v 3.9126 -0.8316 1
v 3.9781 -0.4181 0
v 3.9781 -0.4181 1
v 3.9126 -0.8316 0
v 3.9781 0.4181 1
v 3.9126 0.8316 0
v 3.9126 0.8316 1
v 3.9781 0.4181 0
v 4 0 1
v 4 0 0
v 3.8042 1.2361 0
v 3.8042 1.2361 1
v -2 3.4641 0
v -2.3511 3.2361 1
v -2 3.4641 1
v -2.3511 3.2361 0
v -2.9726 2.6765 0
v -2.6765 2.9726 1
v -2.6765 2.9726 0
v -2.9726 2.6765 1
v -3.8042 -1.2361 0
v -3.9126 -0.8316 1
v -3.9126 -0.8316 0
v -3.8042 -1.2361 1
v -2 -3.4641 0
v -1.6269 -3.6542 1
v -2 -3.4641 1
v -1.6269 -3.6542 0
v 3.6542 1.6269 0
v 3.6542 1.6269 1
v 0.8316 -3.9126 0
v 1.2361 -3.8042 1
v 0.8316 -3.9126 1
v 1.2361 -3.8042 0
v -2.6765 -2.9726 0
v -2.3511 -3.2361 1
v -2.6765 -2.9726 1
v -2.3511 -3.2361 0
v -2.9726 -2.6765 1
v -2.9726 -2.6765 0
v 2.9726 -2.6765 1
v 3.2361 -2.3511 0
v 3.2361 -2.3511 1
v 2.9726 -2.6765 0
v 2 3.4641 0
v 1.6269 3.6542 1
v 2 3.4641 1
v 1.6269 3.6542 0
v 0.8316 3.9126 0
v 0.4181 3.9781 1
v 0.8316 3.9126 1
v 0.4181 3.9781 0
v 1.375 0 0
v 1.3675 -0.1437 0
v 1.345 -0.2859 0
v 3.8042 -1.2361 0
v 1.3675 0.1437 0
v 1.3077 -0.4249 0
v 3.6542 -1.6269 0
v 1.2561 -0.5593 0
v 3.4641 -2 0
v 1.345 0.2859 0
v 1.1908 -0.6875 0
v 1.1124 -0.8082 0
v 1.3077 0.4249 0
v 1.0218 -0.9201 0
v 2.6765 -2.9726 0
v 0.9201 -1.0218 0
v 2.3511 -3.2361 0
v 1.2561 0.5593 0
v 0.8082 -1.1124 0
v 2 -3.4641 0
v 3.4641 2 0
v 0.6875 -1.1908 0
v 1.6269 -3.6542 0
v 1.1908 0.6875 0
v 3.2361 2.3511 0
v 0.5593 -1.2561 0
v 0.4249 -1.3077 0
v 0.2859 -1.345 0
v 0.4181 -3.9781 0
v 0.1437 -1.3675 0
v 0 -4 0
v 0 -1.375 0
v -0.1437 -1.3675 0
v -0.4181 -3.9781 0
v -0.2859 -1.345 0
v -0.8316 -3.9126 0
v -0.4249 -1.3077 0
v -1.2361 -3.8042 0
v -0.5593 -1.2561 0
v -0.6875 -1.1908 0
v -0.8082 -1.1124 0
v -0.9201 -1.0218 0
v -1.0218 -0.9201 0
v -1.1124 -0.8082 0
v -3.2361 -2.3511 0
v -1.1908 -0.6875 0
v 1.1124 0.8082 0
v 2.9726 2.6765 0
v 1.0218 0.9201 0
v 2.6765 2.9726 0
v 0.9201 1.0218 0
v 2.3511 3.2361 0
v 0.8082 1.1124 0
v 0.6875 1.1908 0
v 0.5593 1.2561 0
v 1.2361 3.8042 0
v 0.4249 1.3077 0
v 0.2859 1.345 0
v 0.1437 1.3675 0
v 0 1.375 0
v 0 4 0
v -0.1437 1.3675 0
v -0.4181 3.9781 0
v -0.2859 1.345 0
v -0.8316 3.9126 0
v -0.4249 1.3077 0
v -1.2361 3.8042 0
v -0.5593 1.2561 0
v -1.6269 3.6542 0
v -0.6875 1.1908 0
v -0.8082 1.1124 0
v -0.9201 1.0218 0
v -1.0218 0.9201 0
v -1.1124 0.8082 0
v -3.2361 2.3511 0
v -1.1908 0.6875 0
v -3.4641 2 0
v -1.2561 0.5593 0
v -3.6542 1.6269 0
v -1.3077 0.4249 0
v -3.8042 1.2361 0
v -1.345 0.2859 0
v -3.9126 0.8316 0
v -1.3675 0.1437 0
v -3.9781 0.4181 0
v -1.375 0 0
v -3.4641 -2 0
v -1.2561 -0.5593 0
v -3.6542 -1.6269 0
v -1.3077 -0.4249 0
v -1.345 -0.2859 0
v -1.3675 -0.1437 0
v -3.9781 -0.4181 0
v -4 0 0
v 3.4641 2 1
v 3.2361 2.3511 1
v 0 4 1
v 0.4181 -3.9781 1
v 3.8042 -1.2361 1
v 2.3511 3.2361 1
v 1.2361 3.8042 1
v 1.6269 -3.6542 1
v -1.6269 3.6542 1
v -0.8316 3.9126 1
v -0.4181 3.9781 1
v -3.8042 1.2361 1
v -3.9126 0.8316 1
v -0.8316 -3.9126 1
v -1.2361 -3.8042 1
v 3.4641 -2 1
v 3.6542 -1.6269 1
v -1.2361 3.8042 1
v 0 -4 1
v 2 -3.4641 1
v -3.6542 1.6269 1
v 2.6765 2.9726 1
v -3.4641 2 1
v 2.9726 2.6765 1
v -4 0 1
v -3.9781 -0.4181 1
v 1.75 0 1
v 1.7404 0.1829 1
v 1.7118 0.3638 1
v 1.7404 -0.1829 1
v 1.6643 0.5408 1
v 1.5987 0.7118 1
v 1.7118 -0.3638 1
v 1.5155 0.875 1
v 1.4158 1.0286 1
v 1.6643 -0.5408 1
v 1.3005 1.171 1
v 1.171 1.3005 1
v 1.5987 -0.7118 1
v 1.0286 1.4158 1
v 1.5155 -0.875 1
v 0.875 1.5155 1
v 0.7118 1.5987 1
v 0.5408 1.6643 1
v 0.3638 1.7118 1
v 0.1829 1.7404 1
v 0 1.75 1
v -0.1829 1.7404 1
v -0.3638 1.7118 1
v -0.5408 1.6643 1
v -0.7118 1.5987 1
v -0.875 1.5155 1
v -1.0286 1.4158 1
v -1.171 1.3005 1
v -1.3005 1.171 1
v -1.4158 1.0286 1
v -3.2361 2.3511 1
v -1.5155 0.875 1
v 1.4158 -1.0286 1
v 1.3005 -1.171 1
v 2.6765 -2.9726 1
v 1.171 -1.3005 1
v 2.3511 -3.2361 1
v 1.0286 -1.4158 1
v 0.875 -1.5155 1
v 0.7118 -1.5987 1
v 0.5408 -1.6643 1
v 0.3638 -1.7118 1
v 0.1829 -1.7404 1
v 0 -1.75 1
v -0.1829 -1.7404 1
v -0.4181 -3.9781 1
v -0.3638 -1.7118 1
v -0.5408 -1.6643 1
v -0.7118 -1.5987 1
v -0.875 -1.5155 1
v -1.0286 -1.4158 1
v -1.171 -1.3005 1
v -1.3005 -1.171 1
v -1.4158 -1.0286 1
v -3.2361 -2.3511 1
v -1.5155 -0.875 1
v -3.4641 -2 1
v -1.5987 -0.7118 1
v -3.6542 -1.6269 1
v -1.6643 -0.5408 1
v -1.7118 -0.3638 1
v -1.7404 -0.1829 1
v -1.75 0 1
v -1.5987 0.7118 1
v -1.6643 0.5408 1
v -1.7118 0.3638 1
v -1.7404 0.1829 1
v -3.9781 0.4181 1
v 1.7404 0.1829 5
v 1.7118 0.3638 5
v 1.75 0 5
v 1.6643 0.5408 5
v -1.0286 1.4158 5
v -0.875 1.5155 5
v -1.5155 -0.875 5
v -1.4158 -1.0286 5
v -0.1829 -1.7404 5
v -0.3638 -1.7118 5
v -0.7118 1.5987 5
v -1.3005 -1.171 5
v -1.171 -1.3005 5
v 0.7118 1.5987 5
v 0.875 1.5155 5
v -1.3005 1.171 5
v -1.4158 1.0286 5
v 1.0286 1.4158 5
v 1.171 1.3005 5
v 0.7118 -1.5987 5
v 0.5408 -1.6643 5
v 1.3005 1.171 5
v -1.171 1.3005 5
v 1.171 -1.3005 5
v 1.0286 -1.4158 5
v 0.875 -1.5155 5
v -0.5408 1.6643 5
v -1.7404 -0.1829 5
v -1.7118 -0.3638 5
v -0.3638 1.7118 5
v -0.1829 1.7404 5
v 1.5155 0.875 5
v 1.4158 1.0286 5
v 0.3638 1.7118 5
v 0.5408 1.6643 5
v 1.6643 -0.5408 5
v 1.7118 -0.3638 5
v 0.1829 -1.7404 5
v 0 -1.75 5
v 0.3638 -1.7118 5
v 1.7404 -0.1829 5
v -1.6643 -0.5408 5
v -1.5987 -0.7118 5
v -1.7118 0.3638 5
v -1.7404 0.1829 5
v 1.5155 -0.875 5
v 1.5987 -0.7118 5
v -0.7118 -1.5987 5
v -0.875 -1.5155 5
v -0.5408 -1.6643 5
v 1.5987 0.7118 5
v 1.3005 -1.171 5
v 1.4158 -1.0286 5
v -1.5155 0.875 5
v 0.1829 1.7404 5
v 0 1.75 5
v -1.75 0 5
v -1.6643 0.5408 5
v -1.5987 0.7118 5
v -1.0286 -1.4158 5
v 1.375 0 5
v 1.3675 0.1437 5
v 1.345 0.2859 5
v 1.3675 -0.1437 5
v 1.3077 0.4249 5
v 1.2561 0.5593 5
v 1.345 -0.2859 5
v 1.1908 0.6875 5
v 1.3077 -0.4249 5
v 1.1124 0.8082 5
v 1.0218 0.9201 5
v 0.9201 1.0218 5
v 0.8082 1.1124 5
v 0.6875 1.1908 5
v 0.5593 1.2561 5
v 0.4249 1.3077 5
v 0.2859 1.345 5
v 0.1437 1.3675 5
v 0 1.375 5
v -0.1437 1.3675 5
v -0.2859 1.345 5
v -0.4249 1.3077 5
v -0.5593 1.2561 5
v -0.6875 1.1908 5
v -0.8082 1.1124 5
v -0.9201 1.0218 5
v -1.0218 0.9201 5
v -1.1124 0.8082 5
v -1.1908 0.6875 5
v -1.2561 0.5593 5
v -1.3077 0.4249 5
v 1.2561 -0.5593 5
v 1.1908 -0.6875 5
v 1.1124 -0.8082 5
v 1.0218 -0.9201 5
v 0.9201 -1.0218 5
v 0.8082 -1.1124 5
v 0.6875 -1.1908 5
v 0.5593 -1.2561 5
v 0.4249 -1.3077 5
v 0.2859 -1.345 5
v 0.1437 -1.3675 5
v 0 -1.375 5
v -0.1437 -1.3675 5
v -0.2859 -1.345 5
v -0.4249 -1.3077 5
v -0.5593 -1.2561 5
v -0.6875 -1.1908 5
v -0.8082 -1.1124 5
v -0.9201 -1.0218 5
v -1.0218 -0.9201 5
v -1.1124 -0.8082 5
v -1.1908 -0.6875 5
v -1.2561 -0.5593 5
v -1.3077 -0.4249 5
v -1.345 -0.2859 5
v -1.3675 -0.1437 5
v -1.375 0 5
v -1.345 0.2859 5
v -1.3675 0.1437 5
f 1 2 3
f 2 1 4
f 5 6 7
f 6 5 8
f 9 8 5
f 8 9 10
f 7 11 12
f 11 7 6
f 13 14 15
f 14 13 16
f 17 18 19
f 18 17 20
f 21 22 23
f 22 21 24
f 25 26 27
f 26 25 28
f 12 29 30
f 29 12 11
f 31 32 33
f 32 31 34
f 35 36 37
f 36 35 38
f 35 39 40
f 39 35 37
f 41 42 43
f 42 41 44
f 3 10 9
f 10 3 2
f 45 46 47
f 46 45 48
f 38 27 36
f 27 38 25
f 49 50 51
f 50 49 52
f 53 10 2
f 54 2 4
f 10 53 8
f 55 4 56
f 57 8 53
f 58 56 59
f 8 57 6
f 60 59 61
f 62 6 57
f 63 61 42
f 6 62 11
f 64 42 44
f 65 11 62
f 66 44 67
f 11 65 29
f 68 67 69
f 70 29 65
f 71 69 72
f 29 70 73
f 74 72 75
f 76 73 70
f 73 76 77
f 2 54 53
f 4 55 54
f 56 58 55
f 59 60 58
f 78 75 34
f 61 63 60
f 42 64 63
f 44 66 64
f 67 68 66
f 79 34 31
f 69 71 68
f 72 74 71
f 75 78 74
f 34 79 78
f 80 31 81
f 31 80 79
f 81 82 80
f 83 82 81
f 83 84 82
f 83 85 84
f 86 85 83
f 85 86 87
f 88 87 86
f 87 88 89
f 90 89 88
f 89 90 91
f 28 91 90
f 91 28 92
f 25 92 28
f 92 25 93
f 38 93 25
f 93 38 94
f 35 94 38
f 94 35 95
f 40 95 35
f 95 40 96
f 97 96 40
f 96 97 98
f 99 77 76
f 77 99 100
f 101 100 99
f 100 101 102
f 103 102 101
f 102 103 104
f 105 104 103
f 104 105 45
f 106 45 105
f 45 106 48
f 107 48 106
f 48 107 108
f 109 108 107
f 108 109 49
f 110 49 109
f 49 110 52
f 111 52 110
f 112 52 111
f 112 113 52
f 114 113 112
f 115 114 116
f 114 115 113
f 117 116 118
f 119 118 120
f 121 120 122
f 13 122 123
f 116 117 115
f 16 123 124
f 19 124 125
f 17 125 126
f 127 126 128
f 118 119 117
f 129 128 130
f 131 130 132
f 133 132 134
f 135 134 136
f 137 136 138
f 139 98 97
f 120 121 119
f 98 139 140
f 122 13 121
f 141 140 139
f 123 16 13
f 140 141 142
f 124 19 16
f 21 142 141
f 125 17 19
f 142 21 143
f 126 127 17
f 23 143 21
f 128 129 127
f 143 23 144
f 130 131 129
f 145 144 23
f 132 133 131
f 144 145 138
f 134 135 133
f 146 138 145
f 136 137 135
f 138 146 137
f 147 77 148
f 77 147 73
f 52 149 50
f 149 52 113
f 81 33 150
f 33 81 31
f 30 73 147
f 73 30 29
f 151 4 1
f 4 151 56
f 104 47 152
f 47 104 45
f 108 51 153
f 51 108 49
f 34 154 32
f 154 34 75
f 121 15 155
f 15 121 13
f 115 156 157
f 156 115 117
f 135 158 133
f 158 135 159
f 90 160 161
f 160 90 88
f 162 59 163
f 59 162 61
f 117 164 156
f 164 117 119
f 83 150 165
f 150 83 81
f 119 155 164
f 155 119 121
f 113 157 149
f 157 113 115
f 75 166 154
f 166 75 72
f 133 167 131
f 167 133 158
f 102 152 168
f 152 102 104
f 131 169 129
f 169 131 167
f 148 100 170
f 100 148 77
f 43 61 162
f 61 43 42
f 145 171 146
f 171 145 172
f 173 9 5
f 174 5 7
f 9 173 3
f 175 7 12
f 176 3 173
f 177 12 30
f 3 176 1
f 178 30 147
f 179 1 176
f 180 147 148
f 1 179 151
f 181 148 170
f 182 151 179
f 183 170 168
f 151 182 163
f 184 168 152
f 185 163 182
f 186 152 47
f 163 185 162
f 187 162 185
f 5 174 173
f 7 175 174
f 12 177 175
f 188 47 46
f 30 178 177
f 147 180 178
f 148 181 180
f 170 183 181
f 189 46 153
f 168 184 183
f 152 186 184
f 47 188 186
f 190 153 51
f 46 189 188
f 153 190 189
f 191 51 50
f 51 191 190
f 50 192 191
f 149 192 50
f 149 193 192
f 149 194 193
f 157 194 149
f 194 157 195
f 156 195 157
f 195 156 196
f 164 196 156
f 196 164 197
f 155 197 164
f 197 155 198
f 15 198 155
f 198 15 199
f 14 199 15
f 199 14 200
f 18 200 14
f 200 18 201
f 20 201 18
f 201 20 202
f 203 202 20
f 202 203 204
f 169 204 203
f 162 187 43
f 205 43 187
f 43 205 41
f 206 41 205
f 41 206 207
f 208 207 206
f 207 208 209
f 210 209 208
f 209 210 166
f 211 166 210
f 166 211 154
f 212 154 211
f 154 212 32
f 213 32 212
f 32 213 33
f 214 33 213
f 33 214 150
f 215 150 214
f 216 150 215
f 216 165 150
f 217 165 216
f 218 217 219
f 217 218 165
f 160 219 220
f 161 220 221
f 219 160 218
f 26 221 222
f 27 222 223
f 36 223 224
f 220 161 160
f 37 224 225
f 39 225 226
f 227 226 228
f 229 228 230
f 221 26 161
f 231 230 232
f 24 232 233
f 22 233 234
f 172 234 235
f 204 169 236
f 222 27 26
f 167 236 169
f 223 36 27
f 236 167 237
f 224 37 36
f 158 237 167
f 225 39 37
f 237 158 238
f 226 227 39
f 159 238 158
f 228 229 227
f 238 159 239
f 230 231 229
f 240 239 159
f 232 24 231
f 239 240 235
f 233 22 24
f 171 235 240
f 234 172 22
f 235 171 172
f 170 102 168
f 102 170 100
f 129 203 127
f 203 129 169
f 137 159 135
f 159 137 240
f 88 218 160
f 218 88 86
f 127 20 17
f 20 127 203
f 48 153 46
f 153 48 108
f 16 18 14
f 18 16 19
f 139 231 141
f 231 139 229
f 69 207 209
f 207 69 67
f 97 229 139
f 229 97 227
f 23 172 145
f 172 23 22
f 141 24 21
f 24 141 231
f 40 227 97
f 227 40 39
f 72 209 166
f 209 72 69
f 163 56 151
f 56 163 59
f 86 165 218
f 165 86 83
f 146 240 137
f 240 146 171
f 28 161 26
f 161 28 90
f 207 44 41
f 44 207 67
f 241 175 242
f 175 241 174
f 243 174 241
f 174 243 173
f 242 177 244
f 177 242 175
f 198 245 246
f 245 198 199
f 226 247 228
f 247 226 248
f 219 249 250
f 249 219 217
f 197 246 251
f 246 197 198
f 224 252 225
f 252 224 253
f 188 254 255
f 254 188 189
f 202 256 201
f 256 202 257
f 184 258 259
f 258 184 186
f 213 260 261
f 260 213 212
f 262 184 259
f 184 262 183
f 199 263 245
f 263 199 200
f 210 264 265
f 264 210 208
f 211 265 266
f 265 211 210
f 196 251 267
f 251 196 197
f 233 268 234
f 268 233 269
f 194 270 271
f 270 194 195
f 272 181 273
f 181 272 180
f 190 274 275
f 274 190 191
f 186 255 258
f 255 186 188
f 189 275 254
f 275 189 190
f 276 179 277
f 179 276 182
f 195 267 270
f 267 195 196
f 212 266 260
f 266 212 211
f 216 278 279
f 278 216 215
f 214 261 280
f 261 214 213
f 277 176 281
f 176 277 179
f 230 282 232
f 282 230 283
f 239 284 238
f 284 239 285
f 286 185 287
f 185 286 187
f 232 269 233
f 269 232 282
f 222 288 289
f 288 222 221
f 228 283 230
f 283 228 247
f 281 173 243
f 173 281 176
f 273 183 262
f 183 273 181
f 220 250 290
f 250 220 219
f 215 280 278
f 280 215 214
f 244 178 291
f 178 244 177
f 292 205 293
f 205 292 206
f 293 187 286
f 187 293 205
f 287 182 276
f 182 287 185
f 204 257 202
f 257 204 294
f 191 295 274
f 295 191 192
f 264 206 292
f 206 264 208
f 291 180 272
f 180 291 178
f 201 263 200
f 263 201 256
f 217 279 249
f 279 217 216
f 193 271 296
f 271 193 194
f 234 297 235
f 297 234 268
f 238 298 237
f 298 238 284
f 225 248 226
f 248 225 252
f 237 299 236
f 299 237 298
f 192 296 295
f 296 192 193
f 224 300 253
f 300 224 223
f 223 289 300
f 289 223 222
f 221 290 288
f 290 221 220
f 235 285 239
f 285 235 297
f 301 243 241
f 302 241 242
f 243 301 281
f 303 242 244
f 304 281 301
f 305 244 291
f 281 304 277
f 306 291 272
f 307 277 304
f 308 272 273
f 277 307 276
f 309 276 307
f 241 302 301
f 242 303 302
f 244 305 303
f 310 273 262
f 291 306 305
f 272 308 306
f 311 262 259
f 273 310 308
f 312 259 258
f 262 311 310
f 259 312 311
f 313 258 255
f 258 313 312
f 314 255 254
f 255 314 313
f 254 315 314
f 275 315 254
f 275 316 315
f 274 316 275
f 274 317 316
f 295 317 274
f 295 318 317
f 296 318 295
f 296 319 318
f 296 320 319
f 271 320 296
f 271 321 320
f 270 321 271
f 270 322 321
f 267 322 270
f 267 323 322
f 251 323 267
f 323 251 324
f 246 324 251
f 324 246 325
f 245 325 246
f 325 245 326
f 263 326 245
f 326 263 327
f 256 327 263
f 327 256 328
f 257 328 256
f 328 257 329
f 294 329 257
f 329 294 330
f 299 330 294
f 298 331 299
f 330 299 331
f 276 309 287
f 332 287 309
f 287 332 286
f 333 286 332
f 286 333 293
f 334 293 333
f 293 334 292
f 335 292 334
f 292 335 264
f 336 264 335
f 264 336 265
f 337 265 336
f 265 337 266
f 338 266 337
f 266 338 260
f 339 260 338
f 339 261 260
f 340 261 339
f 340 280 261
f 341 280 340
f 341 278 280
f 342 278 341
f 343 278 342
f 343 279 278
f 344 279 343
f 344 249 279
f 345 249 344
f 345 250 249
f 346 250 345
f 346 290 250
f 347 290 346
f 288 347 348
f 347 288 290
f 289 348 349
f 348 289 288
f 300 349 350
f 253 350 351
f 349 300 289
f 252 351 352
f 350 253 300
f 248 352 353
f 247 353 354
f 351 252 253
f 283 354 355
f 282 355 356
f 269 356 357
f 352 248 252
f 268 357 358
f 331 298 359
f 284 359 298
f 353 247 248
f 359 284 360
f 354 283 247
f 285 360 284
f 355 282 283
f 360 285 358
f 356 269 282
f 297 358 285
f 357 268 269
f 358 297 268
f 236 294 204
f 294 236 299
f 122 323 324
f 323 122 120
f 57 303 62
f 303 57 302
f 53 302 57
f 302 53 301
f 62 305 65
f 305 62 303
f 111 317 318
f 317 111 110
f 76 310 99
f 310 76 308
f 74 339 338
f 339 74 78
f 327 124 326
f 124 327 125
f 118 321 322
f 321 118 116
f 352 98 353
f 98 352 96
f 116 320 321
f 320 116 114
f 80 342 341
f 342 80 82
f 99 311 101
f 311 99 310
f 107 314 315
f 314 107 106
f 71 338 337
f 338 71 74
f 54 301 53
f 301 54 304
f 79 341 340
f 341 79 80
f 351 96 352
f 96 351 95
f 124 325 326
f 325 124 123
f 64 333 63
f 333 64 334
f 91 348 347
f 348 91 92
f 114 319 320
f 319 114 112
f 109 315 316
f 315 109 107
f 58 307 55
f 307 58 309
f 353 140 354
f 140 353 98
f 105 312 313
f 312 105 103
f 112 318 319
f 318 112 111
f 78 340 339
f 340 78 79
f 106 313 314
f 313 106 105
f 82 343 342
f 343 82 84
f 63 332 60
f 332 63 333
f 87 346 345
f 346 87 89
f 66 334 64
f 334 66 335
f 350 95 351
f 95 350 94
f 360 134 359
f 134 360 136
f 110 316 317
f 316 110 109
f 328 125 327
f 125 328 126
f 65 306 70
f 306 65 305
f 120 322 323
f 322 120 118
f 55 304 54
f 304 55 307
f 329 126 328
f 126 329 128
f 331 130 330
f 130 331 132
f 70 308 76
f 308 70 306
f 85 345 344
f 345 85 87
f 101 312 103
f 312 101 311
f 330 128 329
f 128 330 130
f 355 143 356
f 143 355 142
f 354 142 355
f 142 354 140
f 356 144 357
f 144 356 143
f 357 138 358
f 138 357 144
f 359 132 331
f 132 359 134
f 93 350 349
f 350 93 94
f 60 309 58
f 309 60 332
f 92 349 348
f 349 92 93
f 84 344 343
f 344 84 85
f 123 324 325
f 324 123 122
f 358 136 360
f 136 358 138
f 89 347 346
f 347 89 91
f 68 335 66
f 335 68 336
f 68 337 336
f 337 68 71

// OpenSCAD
//capfixer pin

baseD=8;
baseH=1;
neckD= 3.5;//thin value -> 2.85;
neckH=5;
neckDH= 2.75;//thin value -> 2.25;
$fn=60;

difference(){
union(){
cylinder(d=baseD,h=baseH);
cylinder(d=neckD,h=neckH);
}//union

translate([0,0,-1]){
cylinder(d=neckDH,h=10);
}//translate
}//difference
